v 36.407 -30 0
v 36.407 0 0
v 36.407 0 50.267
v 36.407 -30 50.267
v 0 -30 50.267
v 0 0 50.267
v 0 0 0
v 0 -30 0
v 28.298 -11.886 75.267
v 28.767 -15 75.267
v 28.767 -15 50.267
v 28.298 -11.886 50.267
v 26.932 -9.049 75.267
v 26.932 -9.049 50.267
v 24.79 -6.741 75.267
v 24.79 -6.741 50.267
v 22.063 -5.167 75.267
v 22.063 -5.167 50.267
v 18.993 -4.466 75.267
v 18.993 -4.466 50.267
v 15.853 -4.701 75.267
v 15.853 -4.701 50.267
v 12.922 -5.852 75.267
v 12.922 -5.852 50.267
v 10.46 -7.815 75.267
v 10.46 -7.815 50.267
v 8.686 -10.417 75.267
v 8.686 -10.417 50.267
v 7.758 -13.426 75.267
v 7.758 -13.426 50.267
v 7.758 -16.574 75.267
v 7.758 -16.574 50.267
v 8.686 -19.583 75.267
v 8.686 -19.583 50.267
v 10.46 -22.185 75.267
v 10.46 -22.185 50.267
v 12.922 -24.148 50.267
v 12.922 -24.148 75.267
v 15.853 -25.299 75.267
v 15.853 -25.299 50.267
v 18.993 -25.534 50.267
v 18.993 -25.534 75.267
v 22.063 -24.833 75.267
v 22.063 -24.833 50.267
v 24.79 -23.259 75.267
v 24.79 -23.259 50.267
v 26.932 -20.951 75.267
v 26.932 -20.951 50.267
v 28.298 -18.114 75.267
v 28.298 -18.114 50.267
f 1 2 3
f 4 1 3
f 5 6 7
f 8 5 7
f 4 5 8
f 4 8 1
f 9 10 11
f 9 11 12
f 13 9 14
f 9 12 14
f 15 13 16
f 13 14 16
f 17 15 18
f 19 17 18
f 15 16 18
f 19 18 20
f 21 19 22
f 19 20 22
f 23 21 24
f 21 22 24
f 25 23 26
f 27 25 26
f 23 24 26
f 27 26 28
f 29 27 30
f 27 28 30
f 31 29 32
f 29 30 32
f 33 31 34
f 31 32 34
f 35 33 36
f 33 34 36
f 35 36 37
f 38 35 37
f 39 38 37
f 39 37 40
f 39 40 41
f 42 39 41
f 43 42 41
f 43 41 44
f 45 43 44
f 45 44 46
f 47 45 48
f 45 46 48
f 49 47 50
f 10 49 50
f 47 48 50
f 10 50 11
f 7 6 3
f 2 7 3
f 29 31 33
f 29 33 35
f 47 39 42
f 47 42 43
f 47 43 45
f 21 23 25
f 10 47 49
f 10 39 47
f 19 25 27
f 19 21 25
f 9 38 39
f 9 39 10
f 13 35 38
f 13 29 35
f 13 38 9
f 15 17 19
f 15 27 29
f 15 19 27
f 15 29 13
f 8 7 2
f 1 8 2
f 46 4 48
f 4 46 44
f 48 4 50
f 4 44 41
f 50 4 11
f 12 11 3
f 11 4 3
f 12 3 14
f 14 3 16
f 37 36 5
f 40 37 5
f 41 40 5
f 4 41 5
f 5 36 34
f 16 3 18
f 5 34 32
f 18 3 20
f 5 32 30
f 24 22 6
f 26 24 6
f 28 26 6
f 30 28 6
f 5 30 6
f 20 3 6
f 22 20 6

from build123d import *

# Parameters (mm, degrees)
F1_DEPTH = 30
F2_R     = 10.563438
F3_DEPTH = 25


with BuildPart() as f1:
    # F0 (on Front) → F1 (new body)
    with BuildSketch(Plane.XZ):
        Polygon((0, 50.266817), (0, 0), (6.763435, 0), (36.40743, 0), (36.40743, 50.266817), align=None)
    extrude(amount=F1_DEPTH)

    # F2 (on face) → F3 (join)
    with BuildSketch(Plane.XY.offset(50.266817)):
        with Locations((18.203715, -15)):
            Circle(F2_R)
    extrude(amount=F3_DEPTH)


solid = f1.part
